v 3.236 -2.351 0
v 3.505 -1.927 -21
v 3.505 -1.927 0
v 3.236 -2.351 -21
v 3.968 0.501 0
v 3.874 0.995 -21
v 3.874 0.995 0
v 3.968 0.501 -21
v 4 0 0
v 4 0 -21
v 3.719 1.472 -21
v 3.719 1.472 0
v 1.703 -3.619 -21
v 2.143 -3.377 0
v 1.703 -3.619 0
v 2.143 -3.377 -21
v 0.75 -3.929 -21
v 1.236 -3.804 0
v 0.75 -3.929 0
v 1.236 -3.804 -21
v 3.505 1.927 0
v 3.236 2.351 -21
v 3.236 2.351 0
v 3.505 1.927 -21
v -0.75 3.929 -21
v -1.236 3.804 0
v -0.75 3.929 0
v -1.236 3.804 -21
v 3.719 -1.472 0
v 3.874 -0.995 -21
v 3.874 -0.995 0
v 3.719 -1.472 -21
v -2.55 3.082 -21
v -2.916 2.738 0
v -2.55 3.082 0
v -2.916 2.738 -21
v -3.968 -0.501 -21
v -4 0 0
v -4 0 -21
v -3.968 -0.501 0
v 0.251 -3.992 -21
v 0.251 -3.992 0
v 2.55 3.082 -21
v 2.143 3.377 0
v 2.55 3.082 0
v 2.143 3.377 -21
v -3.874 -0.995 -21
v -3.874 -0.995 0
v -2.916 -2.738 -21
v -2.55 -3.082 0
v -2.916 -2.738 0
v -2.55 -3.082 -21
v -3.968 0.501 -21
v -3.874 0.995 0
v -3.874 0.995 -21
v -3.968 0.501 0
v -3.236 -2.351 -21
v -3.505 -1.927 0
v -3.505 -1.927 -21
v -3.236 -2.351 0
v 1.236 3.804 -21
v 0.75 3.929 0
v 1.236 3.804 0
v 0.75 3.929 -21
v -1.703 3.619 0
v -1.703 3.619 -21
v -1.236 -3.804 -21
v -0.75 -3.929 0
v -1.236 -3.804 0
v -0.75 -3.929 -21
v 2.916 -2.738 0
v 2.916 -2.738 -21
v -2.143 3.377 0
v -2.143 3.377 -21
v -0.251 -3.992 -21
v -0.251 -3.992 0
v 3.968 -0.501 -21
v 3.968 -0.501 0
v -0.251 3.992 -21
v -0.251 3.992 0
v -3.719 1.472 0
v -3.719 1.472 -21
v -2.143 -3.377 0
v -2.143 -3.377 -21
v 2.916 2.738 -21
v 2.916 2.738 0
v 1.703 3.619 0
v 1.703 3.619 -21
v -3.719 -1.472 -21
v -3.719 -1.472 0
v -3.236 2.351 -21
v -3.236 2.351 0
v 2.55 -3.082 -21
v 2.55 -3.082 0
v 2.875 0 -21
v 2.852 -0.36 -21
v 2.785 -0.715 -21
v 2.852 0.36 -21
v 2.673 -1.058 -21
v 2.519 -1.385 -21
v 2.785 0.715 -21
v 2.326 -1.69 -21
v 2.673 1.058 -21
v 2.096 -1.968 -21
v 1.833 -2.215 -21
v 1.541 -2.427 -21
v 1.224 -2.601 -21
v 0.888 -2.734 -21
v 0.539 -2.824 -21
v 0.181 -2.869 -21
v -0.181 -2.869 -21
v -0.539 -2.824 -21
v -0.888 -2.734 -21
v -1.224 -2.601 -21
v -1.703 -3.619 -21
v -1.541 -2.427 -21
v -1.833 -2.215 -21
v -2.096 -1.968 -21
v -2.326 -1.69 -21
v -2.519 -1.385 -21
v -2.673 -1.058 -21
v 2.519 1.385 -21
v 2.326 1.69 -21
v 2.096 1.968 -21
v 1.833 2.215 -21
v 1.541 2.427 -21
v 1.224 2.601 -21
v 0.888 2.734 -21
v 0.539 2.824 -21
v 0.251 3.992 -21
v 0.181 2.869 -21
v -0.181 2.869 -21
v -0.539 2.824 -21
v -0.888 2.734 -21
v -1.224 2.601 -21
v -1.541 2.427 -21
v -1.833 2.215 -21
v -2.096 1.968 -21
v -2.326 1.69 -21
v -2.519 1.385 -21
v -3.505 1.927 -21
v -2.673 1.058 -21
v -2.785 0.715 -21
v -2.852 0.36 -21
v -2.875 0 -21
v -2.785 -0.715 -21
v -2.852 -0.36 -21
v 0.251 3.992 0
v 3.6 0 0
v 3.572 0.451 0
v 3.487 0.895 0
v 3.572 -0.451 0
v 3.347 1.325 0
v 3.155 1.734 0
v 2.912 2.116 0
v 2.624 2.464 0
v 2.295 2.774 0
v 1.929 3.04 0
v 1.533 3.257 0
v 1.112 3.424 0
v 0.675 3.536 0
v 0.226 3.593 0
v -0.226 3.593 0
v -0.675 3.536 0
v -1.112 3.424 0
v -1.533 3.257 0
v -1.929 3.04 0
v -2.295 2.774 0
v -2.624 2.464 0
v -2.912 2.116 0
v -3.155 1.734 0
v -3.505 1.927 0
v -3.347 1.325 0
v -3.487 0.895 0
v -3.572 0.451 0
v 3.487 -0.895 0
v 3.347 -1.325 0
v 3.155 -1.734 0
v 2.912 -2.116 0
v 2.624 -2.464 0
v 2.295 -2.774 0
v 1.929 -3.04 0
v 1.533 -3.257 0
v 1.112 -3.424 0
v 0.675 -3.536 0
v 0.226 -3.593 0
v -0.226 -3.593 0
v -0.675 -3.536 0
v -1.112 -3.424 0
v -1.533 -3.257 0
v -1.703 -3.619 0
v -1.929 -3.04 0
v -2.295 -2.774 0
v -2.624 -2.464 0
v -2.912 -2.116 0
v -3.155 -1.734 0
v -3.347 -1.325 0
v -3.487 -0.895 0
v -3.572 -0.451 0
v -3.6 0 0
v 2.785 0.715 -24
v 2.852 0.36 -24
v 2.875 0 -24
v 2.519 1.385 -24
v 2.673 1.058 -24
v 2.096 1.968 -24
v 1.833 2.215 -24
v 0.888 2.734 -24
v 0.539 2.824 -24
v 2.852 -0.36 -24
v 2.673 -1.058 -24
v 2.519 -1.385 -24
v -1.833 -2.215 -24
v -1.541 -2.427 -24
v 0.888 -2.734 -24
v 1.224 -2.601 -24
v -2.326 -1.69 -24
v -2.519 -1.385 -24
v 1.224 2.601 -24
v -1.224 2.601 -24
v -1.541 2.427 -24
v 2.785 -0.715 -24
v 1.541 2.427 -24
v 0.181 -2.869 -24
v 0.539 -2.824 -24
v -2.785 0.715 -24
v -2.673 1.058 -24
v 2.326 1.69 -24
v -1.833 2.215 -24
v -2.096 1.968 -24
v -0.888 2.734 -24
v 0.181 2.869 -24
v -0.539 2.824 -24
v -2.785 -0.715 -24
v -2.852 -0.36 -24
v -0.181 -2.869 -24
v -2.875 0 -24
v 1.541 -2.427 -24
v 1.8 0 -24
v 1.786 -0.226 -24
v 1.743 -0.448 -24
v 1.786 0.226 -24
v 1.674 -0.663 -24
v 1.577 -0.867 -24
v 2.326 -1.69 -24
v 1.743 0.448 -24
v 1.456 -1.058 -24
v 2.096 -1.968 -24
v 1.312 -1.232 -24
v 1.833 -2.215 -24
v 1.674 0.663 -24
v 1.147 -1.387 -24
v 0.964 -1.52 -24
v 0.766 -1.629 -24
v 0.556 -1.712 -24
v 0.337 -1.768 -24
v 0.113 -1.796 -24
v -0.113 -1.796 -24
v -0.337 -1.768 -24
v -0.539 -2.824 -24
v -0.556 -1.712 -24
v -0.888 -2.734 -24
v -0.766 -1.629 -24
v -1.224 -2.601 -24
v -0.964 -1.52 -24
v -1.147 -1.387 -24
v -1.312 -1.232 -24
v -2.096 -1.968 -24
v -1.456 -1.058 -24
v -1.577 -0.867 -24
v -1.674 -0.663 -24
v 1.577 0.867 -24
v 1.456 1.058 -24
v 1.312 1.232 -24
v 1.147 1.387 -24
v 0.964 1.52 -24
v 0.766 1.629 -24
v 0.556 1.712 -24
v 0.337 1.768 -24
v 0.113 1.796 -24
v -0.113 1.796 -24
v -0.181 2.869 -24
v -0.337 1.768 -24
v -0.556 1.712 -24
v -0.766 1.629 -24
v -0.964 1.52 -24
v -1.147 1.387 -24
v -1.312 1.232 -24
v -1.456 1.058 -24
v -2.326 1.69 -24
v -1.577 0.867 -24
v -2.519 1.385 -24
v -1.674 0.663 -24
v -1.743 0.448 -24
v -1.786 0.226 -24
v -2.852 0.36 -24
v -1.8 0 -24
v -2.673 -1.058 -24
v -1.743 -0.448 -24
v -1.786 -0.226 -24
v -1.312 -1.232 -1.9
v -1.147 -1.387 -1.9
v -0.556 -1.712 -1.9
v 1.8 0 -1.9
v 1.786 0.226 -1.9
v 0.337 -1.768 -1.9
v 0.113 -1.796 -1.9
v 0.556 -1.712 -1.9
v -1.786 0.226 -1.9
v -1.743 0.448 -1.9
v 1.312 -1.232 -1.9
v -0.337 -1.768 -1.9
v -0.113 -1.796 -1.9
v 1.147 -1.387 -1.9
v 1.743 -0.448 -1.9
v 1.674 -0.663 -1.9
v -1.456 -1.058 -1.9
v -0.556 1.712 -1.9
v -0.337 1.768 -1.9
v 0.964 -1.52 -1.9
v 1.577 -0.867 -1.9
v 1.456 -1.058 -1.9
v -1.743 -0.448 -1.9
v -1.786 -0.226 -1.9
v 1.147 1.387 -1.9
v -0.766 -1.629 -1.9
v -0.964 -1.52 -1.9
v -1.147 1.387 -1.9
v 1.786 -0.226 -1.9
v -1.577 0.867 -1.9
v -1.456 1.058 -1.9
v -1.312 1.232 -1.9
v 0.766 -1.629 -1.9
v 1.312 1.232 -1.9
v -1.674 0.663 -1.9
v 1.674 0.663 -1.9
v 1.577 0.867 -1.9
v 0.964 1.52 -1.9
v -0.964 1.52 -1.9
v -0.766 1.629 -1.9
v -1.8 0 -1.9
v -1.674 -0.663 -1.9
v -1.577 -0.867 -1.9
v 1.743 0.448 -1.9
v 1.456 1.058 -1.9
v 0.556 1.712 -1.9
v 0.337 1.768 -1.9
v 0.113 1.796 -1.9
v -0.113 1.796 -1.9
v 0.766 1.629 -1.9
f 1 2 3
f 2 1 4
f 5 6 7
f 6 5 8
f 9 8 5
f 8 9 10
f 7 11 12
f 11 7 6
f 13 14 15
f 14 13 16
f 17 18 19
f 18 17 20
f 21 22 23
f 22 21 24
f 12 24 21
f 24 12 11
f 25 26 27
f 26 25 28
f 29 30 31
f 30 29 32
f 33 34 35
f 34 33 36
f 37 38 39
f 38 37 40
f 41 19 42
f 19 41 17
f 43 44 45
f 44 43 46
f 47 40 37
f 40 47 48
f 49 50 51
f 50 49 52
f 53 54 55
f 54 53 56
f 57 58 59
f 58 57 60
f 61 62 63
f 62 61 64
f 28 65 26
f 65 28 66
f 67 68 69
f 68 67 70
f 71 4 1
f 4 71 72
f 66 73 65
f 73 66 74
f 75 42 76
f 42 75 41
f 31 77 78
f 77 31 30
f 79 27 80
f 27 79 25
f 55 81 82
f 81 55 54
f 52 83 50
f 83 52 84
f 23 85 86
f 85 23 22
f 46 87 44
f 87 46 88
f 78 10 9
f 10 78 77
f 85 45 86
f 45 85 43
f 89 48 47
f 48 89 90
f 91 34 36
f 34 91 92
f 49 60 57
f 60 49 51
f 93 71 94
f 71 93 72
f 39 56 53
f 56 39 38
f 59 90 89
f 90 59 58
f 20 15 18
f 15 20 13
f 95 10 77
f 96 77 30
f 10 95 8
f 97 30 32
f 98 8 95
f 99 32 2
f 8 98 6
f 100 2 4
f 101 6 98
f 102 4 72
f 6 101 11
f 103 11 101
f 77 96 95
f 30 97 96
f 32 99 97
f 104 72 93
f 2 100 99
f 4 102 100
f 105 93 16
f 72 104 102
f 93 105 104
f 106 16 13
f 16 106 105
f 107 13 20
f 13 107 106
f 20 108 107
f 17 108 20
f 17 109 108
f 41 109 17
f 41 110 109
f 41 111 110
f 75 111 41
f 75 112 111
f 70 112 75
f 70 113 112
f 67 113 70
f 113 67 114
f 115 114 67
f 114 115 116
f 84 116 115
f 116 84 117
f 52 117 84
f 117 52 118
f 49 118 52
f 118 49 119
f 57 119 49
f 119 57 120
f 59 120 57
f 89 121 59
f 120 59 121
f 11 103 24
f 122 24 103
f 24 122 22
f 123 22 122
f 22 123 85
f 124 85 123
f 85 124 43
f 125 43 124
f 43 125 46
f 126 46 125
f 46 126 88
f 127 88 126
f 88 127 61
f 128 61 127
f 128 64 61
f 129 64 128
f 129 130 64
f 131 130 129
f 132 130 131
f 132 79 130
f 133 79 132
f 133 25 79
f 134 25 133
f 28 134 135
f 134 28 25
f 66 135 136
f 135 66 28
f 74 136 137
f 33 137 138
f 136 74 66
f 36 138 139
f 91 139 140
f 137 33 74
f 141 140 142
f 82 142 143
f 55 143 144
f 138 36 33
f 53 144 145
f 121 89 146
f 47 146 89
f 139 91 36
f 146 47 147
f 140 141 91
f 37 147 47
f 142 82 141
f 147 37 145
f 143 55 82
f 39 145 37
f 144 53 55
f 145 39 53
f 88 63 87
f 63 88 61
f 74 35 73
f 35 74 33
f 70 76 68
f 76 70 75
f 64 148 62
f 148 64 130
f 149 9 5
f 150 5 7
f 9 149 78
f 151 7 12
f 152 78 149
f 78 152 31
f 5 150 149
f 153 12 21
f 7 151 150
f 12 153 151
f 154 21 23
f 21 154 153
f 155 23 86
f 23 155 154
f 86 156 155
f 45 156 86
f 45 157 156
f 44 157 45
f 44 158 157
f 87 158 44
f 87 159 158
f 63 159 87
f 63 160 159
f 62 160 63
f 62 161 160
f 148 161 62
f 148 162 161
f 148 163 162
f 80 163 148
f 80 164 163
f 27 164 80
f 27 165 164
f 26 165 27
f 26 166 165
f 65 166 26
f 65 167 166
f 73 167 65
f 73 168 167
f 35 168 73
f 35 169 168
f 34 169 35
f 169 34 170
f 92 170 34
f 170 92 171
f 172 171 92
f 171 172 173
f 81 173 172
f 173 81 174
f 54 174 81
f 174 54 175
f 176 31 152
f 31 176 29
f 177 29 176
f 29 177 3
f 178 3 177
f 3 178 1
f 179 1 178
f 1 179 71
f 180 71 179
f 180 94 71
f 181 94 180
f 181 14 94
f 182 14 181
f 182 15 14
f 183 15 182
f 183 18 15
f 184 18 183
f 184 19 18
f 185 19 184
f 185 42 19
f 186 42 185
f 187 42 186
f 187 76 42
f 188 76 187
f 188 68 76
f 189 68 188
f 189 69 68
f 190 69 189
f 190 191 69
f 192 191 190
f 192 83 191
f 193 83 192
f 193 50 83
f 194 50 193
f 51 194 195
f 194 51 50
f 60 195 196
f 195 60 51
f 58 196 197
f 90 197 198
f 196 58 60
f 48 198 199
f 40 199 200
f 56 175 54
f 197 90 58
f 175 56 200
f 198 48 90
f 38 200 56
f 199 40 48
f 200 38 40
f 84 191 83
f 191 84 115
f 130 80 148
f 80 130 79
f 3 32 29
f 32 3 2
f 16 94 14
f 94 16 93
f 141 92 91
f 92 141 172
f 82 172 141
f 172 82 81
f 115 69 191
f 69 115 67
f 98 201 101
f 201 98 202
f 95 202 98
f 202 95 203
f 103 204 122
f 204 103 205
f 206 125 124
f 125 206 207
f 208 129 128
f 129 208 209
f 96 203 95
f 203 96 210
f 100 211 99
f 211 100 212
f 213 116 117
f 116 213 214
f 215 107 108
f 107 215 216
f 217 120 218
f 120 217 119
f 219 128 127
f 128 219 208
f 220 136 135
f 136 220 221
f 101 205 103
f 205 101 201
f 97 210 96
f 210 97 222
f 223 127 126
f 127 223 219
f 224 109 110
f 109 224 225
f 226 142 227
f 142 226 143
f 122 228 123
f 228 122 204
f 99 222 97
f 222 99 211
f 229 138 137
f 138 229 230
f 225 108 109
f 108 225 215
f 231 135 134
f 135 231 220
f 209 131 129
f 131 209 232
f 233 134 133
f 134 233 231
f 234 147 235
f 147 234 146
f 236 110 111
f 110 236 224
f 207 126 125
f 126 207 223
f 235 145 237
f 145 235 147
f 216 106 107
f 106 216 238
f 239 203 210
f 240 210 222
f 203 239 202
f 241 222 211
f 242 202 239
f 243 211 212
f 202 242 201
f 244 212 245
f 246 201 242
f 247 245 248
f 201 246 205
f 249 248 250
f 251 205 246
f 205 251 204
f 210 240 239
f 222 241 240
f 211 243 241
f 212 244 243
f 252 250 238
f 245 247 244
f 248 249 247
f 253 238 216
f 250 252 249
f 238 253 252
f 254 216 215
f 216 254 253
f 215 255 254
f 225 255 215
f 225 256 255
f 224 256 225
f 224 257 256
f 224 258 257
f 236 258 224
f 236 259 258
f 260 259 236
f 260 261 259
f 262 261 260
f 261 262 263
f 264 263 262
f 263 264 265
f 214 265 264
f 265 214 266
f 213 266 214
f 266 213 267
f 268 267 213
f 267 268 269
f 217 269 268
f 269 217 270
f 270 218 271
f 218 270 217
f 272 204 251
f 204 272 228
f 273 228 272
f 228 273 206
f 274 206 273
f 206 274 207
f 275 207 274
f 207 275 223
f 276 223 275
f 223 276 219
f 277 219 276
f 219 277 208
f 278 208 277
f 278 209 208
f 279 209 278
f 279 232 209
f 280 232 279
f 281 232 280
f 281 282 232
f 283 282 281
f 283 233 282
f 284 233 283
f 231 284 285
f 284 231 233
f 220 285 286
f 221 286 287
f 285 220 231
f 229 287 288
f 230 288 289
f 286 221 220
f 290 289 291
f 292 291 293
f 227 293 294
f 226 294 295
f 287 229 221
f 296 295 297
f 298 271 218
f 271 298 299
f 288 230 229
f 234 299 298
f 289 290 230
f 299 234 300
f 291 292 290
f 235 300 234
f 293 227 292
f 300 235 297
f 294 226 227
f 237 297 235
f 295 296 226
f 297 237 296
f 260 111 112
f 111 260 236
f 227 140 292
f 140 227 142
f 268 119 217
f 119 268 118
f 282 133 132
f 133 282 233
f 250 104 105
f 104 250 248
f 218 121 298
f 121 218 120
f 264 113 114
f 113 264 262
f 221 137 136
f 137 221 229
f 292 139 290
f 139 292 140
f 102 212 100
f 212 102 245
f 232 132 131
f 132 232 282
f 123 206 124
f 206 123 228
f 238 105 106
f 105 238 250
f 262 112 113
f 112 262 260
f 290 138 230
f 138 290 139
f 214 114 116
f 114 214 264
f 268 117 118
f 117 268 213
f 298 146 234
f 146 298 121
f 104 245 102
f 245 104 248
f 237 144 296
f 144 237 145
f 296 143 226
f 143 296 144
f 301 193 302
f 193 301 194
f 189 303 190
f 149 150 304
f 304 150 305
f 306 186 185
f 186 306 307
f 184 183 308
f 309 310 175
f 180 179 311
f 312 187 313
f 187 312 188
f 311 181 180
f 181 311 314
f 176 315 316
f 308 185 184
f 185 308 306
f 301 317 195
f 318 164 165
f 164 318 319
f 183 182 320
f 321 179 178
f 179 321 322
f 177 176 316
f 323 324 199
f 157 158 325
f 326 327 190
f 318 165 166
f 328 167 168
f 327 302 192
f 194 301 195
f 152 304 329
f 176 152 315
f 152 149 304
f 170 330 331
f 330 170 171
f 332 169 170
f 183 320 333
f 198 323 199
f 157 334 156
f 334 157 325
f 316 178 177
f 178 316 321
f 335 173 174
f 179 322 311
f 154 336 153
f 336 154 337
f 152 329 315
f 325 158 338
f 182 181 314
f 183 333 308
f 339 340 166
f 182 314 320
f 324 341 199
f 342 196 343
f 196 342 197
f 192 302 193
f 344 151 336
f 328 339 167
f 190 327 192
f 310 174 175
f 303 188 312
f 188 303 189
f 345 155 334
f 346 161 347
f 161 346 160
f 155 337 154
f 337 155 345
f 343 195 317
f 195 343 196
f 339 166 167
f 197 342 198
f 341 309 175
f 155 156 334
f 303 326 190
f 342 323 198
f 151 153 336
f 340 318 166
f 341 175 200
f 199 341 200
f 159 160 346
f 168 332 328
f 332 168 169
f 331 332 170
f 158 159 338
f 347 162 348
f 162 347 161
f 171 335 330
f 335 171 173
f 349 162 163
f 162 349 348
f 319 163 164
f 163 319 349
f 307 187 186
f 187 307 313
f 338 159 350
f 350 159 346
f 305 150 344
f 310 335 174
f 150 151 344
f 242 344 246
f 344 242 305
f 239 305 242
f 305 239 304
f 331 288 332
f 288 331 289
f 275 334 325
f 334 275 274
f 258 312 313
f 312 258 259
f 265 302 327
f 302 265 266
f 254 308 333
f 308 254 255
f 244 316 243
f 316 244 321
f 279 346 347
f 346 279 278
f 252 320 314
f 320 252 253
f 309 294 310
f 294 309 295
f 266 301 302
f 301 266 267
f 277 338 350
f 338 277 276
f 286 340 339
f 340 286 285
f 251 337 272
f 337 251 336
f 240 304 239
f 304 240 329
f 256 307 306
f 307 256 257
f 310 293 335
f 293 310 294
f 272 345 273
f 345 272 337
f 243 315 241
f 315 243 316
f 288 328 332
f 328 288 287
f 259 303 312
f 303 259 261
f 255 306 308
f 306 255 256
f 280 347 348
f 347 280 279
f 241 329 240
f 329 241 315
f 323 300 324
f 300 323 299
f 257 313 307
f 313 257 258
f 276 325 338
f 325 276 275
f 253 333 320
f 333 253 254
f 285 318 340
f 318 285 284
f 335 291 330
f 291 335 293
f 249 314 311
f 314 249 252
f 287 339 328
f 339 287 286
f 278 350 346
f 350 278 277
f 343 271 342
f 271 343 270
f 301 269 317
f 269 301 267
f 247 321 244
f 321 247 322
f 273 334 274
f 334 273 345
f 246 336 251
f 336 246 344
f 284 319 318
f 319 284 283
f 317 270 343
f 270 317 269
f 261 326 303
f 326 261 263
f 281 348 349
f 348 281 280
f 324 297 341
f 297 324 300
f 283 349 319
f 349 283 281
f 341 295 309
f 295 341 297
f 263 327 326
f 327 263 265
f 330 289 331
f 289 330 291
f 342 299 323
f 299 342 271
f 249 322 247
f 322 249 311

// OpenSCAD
$fn = 50;

difference() {
	union() {
		translate(v = [0, 0, -21.0]) {
			cylinder(h = 21, r = 4.0);
		}
		#translate(v = [0, 0, -24.0]) {
			cylinder(h = 24, r = 2.875);
		}
	}
	union() {
		translate(v = [0, 0, 0]) {
			rotate(a = [0, 0, 0]) {
				difference() {
					union() {
						translate(v = [0, 0, -24.0]) {
							cylinder(h = 24, r = 1.5);
						}
						translate(v = [0, 0, -1.9]) {
							cylinder(h = 1.9, r1 = 1.8, r2 = 3.6);
						}
						translate(v = [0, 0, -24.0]) {
							cylinder(h = 24, r = 1.8);
						}
						translate(v = [0, 0, -24.0]) {
							cylinder(h = 24, r = 1.5);
						}
					}
					union();
				}
			}
		}
	}
}
